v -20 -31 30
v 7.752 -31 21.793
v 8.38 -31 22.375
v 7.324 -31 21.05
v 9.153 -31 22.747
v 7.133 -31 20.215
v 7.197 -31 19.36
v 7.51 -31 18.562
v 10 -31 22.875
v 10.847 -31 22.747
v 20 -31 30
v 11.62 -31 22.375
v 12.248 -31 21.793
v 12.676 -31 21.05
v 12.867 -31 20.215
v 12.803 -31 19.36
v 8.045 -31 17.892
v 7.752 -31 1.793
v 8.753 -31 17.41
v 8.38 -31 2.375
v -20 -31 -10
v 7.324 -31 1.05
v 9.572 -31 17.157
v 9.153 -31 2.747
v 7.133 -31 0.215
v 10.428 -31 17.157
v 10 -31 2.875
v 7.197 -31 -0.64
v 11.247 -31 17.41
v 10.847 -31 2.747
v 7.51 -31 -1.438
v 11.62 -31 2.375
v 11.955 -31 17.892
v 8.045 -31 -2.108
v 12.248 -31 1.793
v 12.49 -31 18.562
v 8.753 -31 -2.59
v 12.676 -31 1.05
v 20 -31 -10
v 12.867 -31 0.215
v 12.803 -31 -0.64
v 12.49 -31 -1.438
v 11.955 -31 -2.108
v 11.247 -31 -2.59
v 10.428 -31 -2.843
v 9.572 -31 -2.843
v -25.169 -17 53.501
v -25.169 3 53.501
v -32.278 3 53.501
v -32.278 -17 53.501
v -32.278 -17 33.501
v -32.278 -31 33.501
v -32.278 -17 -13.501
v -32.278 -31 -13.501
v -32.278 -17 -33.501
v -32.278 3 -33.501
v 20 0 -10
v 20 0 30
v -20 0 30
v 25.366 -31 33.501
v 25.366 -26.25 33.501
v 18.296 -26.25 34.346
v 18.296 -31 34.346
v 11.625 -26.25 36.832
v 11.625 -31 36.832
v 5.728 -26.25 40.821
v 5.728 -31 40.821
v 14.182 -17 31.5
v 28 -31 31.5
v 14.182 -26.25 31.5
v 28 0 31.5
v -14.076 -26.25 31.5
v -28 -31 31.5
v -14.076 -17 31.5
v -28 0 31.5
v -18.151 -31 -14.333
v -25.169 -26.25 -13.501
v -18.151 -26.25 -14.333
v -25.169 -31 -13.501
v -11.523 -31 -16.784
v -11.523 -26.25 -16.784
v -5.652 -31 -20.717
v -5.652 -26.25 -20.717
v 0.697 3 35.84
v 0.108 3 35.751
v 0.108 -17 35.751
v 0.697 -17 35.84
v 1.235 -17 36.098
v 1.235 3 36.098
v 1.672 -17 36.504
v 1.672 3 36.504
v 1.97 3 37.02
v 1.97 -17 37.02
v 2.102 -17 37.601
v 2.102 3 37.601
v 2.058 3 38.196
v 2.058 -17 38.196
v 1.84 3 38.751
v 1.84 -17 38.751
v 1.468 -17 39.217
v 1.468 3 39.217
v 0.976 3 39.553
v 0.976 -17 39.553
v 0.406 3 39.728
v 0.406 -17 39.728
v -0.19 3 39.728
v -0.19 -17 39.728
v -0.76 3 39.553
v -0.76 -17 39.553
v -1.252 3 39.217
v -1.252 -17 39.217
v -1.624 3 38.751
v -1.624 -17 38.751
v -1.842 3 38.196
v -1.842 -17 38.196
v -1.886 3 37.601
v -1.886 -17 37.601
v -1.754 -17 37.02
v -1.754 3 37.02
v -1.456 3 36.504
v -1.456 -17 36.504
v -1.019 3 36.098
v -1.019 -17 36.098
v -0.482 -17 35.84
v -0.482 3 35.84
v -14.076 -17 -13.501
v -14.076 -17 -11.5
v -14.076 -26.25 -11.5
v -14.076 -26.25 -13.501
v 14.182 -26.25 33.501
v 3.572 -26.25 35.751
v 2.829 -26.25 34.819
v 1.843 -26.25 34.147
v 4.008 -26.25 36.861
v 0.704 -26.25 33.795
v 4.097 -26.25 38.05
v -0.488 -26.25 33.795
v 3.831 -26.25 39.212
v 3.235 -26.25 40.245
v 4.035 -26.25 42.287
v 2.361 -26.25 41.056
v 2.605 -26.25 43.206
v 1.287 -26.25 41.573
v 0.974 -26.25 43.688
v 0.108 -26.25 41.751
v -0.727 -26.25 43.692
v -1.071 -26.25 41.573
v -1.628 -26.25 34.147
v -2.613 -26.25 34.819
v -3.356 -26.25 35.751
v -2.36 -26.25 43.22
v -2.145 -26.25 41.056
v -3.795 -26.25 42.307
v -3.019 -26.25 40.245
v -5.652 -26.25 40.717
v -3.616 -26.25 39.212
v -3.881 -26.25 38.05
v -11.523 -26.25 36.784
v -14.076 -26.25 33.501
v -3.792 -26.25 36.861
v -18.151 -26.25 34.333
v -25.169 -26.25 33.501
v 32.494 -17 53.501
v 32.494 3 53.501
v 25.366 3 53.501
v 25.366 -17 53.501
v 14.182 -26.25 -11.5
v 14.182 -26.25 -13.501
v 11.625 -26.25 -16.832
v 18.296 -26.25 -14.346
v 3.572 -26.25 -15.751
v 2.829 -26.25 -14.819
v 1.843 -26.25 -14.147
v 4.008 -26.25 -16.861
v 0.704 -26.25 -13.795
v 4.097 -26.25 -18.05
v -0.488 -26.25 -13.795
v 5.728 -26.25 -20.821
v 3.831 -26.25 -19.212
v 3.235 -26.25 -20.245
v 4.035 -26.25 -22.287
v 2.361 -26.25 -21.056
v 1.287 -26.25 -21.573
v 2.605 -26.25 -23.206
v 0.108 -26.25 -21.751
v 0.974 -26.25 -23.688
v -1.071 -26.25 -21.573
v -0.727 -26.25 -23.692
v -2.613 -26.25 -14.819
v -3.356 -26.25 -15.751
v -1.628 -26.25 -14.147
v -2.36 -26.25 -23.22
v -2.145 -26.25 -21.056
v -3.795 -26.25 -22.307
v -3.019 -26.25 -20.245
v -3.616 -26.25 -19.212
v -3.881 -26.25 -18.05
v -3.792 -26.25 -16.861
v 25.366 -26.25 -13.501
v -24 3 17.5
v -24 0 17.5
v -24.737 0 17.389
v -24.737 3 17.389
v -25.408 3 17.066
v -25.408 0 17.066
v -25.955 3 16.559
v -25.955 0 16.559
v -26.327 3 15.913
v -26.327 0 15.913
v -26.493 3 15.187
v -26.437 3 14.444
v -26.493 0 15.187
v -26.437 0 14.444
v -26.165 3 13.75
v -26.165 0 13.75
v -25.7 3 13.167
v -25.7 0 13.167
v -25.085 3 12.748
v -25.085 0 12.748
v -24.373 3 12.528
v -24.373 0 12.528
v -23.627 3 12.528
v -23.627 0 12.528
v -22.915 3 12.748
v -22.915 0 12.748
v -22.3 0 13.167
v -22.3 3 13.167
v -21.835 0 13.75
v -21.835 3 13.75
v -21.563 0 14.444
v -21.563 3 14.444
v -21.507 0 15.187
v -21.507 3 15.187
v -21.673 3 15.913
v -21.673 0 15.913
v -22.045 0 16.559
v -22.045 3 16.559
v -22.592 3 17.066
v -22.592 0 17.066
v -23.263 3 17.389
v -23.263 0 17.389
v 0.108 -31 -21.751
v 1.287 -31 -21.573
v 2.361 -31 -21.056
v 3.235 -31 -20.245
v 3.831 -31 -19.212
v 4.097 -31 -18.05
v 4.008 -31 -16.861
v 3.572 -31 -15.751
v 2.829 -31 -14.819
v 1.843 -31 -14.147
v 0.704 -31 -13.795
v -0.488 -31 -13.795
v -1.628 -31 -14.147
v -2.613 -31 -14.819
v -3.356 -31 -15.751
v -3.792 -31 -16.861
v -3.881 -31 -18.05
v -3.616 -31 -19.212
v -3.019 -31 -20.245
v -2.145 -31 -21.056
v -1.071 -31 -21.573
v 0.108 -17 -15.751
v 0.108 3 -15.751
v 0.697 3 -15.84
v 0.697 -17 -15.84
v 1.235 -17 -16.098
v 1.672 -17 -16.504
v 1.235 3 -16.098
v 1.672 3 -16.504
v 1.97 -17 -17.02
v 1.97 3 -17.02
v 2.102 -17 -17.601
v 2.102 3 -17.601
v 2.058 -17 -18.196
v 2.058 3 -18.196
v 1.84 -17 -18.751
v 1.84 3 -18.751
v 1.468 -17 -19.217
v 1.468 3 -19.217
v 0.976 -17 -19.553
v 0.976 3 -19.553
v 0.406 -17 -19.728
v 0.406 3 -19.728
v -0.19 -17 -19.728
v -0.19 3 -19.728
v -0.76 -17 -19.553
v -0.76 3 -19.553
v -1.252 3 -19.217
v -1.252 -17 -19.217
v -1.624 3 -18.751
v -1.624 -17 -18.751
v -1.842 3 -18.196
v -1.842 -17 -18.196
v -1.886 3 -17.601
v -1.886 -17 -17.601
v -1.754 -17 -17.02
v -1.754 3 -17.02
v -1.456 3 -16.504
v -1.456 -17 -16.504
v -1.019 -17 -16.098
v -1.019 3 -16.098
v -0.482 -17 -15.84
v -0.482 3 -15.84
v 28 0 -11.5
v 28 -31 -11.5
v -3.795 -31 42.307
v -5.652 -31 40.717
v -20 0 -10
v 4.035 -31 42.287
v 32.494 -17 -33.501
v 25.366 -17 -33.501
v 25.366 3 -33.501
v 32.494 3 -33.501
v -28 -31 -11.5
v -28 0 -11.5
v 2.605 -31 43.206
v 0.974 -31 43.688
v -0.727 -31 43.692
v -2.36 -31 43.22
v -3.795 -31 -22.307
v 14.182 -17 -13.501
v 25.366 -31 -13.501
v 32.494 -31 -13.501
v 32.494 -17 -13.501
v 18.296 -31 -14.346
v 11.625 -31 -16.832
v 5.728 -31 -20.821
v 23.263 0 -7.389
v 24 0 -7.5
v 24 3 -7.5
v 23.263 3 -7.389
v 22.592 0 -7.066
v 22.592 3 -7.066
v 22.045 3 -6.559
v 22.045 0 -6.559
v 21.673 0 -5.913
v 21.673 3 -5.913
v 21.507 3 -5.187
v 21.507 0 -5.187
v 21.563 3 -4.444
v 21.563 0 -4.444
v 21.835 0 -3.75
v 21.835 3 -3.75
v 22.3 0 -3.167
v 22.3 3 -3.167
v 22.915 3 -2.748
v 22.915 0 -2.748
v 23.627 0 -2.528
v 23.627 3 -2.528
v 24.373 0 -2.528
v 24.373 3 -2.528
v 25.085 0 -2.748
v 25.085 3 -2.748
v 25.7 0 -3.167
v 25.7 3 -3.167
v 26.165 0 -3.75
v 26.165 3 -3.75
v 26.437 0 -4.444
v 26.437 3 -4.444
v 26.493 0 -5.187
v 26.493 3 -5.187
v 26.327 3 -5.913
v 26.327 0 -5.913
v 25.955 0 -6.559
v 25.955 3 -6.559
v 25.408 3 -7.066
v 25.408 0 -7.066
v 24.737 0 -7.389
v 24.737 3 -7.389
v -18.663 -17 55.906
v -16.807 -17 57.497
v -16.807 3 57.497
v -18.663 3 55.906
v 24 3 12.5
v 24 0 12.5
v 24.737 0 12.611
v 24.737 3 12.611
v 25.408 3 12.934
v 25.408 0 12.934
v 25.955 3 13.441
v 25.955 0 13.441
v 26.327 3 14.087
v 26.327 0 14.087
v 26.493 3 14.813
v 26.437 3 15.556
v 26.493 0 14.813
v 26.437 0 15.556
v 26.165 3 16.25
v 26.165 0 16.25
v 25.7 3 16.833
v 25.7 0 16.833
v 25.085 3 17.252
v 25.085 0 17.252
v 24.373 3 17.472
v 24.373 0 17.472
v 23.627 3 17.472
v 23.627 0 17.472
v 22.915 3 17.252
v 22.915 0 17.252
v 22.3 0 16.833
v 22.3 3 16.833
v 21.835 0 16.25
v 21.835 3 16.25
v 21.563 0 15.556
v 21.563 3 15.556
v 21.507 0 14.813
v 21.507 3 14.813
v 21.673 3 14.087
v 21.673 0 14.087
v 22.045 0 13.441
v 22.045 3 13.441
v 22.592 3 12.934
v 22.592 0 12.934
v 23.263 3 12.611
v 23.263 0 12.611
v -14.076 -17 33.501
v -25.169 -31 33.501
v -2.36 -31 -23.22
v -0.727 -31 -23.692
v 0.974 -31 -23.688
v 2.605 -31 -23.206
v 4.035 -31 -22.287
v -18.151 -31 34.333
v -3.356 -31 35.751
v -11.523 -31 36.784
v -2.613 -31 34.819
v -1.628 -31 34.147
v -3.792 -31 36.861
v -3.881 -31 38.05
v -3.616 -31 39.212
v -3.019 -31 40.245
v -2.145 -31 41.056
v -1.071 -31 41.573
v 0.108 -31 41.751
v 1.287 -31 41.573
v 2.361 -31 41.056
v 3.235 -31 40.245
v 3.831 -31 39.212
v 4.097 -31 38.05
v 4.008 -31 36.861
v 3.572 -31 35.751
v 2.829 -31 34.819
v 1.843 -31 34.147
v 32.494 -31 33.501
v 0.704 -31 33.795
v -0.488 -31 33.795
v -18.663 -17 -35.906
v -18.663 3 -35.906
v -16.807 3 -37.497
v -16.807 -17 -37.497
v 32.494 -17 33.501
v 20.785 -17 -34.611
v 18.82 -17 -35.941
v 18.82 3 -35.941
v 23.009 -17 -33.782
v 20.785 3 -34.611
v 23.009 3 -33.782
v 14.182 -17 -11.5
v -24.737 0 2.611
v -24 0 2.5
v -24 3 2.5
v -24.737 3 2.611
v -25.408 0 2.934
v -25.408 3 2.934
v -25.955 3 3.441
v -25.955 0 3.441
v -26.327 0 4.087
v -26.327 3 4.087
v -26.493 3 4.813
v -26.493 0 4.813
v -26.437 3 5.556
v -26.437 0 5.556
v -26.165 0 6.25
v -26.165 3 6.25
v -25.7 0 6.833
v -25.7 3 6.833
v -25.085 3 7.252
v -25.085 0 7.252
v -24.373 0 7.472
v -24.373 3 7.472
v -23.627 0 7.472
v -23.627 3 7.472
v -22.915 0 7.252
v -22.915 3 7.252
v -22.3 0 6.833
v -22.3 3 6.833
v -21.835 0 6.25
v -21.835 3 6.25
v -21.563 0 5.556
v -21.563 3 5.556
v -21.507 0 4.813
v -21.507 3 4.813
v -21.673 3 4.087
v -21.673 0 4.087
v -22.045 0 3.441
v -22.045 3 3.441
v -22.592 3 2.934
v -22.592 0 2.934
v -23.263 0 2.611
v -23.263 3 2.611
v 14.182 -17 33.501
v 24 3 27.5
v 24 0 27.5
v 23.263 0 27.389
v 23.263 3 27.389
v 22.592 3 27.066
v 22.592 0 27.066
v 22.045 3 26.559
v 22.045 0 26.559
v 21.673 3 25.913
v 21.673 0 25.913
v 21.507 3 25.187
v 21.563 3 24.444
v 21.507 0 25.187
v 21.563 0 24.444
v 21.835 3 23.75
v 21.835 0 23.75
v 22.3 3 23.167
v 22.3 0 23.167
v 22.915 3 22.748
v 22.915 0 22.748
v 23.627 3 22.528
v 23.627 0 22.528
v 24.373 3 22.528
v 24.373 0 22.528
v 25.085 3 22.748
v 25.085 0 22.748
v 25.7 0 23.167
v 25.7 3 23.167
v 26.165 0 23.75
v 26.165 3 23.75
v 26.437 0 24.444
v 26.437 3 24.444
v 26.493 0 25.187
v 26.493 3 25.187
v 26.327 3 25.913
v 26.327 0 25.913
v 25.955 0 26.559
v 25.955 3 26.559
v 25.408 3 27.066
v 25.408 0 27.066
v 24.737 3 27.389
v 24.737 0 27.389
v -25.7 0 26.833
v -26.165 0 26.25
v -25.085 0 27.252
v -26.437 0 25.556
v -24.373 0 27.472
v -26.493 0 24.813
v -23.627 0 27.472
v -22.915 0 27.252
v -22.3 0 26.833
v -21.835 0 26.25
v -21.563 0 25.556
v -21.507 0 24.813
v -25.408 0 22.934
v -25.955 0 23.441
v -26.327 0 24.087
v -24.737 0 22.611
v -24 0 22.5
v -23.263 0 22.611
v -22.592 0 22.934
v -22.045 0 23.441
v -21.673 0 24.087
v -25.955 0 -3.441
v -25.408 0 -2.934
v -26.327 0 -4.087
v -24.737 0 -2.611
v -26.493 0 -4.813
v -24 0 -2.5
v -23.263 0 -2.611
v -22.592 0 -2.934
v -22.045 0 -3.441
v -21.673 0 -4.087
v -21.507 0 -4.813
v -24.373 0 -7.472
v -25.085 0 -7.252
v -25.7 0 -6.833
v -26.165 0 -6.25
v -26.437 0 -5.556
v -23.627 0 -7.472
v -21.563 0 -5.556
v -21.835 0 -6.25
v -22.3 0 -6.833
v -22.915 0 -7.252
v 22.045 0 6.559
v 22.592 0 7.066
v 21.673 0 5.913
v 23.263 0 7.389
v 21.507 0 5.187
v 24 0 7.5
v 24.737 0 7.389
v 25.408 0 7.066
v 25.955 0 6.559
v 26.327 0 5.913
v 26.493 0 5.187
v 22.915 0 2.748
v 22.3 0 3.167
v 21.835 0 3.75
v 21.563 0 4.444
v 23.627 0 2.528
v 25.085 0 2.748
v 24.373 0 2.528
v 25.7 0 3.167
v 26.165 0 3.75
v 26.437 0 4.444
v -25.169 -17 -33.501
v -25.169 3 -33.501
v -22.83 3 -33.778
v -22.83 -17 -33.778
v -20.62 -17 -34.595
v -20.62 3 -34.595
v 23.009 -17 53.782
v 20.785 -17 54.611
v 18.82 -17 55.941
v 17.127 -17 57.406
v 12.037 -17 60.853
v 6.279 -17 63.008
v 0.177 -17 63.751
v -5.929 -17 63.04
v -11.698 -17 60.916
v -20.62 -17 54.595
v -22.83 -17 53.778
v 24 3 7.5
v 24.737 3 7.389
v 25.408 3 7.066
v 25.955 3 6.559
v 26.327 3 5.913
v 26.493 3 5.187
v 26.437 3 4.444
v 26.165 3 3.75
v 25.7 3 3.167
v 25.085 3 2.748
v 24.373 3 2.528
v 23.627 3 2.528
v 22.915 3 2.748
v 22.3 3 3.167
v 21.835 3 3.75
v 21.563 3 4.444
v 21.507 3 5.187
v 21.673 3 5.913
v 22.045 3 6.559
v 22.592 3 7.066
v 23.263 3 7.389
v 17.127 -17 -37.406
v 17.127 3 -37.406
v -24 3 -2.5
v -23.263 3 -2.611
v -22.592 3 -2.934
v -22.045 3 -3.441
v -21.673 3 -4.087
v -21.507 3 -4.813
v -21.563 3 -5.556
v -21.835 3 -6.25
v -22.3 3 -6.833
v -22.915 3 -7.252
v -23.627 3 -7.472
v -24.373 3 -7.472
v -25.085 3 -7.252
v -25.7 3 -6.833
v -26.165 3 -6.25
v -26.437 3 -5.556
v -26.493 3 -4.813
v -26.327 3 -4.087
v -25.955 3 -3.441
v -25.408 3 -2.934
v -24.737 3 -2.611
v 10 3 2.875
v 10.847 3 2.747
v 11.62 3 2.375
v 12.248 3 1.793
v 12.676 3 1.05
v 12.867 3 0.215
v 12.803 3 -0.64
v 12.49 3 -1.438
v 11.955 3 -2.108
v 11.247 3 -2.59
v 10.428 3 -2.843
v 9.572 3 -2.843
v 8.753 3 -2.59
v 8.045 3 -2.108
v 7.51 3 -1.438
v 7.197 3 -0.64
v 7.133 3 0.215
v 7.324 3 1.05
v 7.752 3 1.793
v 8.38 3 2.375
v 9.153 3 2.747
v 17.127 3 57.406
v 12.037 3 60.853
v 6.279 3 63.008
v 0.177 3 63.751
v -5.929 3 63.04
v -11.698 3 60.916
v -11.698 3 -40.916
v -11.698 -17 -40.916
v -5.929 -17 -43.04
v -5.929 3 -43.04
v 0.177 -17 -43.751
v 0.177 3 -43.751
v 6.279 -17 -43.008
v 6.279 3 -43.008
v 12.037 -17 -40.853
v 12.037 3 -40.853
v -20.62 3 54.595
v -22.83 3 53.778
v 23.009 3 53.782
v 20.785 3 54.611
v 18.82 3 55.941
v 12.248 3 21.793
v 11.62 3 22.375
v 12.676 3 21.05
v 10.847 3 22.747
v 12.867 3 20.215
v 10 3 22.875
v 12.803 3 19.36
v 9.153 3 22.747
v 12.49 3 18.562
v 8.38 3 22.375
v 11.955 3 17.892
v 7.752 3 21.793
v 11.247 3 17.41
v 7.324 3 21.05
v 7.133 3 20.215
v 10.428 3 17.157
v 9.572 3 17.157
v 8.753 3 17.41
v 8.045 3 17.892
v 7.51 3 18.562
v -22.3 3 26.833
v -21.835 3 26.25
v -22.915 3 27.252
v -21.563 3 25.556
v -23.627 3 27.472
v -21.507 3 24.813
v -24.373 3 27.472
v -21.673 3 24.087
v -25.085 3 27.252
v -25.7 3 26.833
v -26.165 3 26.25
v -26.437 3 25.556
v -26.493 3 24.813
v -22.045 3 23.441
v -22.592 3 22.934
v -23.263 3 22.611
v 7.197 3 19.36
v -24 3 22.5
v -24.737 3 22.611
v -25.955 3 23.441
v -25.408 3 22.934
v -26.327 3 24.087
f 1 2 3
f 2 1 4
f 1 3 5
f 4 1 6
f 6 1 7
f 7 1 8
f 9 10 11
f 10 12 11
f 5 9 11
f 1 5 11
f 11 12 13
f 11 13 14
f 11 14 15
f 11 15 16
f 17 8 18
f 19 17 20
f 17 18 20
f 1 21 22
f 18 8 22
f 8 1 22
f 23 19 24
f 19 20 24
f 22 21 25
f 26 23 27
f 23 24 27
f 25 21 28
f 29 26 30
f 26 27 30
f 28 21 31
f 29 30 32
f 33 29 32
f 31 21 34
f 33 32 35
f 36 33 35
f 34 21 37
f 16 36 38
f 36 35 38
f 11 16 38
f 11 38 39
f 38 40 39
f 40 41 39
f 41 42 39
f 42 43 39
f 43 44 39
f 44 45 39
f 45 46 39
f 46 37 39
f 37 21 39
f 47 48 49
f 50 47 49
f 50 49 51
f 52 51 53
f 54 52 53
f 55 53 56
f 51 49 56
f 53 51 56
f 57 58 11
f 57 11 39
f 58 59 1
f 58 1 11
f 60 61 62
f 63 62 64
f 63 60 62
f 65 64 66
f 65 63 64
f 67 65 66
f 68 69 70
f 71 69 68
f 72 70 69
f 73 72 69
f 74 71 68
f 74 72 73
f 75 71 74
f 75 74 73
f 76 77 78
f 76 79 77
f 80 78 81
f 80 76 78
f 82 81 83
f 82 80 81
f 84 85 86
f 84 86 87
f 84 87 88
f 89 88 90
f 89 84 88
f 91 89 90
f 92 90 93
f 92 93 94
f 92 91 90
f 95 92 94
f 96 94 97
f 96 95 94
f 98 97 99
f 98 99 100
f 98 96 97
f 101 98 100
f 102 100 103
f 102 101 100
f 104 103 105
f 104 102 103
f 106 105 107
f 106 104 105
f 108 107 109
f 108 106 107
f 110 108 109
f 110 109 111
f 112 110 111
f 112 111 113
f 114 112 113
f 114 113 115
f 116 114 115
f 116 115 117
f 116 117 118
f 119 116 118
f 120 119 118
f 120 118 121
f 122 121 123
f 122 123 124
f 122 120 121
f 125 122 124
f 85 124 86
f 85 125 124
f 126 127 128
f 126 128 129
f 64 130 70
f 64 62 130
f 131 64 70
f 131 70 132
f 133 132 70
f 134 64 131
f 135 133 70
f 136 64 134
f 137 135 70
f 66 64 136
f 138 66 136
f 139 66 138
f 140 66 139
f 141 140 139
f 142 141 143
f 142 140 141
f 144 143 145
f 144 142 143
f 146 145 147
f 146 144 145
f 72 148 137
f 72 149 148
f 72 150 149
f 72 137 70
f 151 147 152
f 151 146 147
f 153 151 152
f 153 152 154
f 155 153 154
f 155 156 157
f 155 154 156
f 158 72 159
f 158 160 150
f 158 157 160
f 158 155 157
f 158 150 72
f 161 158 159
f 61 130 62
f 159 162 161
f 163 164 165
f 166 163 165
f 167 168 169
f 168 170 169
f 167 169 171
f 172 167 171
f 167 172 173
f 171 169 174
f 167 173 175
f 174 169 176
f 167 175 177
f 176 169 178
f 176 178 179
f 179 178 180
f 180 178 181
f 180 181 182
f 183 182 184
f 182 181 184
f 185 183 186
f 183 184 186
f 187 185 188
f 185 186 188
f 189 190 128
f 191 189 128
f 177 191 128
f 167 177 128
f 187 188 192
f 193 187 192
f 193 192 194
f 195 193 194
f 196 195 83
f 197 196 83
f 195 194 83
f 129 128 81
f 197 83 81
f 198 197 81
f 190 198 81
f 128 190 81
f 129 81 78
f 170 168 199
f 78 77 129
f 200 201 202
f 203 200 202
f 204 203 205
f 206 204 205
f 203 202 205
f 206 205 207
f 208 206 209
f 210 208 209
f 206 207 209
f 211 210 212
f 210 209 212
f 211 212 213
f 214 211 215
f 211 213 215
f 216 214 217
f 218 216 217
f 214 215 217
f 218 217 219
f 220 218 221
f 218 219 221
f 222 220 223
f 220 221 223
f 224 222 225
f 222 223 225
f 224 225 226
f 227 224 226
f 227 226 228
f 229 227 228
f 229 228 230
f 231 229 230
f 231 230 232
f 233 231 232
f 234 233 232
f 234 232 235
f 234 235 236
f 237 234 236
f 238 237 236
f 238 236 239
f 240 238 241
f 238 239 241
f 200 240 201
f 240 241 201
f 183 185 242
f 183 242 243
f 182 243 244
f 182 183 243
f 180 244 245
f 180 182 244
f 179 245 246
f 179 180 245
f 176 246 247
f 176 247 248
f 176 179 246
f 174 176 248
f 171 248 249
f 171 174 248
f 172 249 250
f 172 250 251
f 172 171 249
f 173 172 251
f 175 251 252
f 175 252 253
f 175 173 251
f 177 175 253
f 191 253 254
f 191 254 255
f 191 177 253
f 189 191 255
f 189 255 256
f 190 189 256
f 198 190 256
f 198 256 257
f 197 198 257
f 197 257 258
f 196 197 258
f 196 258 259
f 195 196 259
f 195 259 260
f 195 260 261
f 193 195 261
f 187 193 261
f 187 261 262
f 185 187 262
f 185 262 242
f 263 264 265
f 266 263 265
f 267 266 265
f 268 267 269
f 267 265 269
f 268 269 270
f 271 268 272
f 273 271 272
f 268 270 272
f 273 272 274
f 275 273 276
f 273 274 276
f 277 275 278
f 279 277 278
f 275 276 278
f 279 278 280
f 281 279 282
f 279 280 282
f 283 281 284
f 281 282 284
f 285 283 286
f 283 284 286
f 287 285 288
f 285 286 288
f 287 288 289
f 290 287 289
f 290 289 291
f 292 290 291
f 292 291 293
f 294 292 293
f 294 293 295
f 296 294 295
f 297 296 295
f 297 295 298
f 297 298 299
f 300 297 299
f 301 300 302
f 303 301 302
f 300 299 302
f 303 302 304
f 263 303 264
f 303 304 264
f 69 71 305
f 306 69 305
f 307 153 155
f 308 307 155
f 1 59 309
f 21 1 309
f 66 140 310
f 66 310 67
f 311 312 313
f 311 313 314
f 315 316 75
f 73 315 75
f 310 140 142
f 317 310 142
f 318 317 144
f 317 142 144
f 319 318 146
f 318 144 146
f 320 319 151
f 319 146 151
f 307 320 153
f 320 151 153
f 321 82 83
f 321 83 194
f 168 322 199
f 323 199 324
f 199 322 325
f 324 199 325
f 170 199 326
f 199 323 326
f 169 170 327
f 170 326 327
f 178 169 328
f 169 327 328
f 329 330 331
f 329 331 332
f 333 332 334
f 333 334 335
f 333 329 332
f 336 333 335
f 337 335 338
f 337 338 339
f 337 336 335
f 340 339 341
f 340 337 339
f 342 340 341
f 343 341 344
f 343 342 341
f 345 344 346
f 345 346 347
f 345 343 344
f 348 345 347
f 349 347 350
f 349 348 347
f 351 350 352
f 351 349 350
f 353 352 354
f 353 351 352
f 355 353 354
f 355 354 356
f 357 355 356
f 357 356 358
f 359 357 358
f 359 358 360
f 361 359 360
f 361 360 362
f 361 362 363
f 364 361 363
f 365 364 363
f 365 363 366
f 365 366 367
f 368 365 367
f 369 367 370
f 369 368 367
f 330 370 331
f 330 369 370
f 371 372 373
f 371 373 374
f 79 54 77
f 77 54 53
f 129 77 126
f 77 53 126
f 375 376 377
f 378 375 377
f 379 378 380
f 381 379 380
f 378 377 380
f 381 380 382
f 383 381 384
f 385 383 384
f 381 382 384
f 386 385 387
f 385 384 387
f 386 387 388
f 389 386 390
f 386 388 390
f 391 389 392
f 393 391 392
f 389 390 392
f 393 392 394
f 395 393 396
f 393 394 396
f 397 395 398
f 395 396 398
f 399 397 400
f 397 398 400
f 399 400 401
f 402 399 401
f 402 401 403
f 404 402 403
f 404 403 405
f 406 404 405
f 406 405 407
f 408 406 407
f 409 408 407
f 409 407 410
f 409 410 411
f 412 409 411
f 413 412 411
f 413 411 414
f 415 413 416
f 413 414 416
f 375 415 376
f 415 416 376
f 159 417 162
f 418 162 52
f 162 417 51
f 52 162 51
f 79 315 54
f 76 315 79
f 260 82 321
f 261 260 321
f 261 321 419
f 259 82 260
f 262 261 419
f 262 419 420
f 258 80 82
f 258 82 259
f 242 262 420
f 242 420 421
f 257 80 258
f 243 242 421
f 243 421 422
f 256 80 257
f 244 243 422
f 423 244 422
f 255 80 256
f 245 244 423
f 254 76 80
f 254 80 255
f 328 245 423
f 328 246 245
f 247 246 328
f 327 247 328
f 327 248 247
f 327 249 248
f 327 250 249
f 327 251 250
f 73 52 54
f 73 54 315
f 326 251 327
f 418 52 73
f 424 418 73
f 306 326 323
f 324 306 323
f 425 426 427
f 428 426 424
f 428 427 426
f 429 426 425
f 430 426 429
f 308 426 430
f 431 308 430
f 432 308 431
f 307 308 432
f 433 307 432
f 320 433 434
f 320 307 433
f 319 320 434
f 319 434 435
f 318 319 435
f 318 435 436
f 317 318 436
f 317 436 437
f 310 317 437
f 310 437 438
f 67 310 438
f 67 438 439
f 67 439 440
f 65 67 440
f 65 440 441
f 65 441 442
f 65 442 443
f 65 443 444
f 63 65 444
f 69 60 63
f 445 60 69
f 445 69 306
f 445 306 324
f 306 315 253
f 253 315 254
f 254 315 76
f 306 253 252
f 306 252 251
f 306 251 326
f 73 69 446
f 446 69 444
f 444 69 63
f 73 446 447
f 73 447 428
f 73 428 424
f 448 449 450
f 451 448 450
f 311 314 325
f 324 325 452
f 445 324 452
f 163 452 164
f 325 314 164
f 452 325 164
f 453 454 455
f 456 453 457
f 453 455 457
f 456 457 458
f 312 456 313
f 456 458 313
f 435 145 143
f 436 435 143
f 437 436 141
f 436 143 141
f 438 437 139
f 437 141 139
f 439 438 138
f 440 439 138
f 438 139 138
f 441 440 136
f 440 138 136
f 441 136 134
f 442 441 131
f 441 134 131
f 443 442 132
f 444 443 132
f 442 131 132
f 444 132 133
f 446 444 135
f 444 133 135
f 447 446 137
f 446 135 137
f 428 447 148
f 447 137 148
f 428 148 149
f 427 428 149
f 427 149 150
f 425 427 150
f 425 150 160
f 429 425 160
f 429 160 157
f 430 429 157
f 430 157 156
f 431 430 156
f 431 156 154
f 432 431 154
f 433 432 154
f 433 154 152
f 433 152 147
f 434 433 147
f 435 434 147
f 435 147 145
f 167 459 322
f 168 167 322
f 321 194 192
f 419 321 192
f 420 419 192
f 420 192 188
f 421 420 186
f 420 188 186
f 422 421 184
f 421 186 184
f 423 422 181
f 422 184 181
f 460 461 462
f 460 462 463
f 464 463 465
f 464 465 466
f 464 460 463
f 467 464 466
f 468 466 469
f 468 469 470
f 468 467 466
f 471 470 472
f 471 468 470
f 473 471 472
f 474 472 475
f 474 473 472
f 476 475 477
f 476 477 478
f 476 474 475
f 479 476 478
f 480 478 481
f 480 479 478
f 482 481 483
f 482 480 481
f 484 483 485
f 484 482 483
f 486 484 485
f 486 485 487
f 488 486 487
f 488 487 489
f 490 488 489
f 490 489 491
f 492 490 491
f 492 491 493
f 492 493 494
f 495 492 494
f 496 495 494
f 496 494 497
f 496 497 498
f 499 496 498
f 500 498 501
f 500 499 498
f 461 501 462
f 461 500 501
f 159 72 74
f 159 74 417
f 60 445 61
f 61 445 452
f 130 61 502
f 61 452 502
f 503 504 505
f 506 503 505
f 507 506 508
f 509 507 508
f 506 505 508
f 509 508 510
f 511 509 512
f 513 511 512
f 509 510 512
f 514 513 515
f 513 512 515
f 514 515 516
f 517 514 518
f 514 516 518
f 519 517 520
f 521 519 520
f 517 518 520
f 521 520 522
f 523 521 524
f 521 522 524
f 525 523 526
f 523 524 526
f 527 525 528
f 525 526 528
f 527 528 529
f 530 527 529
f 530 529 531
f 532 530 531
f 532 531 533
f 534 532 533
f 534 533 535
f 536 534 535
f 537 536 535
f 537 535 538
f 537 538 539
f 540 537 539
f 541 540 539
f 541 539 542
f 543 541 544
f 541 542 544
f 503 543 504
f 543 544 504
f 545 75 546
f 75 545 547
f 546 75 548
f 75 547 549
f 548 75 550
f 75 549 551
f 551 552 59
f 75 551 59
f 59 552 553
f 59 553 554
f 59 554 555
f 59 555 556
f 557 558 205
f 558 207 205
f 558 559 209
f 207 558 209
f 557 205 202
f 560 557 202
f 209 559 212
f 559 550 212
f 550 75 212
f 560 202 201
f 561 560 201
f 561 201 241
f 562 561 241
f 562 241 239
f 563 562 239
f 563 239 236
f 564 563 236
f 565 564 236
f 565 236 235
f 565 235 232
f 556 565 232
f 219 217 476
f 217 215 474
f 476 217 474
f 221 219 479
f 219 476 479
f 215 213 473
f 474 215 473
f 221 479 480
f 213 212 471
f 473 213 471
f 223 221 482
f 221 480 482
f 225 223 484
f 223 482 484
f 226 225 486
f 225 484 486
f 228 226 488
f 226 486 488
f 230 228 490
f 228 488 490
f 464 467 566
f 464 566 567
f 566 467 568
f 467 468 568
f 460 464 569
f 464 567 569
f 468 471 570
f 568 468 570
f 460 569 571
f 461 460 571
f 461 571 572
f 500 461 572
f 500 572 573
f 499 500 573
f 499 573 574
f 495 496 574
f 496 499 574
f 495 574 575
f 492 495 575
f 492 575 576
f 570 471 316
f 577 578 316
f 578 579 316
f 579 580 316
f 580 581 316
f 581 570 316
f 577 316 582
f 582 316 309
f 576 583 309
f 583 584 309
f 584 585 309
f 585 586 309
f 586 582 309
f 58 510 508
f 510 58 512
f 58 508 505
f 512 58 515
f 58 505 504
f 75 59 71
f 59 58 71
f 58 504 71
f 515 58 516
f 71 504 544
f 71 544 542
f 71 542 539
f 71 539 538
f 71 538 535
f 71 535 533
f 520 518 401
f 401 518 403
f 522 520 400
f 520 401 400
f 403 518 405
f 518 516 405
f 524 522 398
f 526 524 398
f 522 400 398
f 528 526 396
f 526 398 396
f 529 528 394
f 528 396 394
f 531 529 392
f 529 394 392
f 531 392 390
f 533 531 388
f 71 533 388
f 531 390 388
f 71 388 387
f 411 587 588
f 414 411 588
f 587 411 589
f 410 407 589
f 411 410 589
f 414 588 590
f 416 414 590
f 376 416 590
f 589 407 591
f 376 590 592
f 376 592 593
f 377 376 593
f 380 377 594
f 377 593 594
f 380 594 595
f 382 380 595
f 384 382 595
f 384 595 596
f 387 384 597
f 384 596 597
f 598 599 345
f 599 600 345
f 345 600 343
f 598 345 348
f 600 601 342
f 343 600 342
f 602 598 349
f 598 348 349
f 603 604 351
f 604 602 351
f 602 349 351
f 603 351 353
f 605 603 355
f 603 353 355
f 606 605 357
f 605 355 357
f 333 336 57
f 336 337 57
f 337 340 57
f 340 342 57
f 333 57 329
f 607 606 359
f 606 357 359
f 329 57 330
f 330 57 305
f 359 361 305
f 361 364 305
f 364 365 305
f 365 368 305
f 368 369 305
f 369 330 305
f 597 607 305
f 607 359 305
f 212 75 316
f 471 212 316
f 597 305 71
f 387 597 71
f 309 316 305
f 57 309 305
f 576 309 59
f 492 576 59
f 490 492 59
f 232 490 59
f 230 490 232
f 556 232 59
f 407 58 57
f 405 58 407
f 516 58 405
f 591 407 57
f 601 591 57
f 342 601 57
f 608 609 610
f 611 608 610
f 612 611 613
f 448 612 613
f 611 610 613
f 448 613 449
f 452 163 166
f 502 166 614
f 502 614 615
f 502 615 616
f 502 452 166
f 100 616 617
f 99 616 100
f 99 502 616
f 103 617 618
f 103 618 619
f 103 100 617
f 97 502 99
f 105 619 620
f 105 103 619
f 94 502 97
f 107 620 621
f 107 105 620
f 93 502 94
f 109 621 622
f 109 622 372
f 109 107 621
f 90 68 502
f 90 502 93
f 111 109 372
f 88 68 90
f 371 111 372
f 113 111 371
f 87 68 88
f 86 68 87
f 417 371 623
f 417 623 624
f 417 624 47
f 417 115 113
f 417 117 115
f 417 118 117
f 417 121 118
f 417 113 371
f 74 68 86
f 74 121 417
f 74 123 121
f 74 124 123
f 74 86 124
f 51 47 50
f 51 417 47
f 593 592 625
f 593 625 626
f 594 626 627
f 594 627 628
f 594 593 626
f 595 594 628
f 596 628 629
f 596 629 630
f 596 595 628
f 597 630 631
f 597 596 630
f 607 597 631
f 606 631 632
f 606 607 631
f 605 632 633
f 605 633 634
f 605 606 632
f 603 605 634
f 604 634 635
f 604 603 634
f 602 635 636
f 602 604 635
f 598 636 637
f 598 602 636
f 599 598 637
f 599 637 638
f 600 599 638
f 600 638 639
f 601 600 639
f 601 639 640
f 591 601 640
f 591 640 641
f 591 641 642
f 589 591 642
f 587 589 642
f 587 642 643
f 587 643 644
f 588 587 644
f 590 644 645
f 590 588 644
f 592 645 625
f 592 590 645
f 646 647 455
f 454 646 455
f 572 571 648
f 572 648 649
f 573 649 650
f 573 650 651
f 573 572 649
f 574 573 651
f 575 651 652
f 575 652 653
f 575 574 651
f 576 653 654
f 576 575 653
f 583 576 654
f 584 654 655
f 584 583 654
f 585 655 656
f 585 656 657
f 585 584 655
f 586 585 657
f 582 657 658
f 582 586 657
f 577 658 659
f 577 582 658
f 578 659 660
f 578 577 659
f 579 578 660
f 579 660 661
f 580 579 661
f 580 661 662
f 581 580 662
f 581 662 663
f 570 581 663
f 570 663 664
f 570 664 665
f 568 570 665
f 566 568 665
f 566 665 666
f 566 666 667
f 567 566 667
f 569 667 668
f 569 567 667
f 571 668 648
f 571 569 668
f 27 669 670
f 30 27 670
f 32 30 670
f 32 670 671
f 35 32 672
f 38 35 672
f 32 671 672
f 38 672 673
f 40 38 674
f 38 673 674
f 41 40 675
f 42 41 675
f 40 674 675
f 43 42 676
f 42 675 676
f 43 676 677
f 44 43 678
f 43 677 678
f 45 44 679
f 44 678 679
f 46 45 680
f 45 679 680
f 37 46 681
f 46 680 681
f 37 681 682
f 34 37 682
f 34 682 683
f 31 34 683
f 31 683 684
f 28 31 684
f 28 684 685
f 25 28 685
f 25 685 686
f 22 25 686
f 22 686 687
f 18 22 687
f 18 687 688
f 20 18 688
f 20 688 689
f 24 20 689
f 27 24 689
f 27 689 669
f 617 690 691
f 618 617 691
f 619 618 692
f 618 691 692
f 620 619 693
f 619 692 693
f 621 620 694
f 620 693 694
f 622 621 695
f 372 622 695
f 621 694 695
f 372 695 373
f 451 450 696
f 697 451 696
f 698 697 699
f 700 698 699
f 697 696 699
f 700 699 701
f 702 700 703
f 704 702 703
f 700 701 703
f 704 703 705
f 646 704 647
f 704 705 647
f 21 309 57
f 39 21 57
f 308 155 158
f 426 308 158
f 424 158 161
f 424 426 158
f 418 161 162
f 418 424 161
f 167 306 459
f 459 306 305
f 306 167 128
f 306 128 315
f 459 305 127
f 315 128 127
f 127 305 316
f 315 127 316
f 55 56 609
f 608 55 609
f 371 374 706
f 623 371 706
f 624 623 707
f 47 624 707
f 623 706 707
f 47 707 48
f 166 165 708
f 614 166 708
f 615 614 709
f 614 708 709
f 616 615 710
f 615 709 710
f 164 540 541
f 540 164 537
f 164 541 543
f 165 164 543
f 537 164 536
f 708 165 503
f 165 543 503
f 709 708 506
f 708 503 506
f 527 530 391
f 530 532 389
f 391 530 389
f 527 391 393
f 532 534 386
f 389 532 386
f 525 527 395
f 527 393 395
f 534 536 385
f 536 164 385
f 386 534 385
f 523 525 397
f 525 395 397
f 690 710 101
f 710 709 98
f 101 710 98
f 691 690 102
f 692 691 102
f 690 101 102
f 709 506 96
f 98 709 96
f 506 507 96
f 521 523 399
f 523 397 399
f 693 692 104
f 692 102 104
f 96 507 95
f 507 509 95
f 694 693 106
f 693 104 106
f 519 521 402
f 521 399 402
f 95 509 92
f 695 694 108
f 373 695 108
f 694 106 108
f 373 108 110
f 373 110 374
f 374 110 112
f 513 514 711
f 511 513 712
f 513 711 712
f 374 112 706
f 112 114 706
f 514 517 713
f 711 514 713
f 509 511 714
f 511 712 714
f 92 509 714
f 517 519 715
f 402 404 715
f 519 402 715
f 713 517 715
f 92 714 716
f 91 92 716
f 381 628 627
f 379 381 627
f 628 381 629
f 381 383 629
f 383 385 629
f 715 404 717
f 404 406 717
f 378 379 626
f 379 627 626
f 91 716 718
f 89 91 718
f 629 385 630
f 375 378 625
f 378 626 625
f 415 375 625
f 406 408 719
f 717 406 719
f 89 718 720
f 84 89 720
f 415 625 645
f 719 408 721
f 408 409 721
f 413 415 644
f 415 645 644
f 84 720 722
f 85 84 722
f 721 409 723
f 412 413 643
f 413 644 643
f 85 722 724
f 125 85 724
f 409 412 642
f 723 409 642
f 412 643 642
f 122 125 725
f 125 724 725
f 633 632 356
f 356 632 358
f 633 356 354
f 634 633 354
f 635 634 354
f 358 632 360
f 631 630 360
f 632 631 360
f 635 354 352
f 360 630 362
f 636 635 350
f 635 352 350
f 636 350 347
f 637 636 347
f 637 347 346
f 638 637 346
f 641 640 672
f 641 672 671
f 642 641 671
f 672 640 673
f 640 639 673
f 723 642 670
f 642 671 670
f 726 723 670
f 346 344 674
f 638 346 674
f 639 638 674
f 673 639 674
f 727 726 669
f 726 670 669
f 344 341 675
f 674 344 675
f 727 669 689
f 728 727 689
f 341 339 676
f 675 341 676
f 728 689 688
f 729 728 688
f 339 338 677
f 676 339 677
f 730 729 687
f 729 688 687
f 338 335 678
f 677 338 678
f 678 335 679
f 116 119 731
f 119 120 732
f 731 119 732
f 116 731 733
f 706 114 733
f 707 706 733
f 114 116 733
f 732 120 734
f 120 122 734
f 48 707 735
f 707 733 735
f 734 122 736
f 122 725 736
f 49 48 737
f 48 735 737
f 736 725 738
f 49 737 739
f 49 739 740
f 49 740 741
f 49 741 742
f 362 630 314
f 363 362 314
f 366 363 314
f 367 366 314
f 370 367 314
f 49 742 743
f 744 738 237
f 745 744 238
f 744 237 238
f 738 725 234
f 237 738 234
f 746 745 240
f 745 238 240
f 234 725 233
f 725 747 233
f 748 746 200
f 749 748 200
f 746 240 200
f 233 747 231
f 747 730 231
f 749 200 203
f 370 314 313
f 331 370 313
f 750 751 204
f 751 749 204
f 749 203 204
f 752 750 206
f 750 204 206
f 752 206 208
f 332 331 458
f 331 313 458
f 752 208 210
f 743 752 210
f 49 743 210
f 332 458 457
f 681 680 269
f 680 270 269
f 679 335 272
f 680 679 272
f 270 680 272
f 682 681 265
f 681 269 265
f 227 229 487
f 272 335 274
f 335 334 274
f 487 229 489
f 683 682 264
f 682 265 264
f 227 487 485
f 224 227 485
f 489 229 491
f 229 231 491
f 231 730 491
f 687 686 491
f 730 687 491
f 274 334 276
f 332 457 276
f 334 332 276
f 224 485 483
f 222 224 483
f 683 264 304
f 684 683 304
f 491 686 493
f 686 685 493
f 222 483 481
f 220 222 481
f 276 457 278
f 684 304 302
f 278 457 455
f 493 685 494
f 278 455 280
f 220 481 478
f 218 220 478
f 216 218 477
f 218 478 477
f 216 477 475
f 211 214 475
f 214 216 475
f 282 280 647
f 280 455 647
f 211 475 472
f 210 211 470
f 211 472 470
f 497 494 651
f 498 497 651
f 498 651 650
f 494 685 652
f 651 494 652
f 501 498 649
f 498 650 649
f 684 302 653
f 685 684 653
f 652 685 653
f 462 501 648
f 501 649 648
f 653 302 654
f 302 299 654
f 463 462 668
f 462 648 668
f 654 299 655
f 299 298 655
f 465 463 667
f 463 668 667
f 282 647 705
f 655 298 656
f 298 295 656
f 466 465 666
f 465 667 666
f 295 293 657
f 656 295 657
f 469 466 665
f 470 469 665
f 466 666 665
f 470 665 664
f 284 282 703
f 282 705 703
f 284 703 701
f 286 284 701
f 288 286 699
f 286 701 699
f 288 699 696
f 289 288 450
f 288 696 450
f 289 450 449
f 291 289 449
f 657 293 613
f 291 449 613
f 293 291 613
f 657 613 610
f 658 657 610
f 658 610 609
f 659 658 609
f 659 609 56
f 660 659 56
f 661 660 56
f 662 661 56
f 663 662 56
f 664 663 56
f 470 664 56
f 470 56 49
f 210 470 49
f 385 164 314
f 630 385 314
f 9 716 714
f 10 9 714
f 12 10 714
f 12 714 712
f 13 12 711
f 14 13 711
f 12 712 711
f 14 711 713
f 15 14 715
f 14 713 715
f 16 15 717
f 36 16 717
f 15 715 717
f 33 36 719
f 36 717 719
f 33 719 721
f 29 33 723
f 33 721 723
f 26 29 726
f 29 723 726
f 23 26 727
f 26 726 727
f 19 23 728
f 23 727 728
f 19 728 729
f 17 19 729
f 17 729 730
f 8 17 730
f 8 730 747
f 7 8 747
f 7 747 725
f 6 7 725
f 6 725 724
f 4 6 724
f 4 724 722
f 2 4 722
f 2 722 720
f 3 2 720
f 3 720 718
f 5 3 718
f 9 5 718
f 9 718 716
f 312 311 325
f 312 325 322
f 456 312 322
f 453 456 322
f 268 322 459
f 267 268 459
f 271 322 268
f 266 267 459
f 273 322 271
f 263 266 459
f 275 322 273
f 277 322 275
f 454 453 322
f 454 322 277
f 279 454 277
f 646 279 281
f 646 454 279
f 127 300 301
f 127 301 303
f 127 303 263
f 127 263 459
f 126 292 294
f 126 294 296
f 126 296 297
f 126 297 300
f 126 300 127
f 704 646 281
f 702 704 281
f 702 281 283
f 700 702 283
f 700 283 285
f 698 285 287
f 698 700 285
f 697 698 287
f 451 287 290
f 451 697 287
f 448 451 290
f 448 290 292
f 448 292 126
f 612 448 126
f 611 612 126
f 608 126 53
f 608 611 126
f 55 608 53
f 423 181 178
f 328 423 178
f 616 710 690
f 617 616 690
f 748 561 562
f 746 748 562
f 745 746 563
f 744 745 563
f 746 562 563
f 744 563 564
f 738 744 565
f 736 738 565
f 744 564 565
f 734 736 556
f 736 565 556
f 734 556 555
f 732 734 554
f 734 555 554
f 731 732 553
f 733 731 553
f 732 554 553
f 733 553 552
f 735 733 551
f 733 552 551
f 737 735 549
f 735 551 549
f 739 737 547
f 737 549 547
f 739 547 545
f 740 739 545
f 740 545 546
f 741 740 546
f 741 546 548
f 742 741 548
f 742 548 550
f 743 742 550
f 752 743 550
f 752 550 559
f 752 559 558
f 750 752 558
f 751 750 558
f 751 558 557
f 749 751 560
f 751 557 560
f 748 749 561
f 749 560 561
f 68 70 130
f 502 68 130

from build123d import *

# Parameters (mm, degrees)
SKETCH2_R           = 2.5
BOSS_EXTRUDE1_DEPTH = 3
BOSS_EXTRUDE2_DEPTH = 20
SKETCH4_R           = 2
BOSS_EXTRUDE3_DEPTH = 20
SKETCH6_R           = 4
BOSS_EXTRUDE5_DEPTH = 14
SKETCH7_W           = 28.258698574
SKETCH7_H           = 15
CUT_EXTRUDE1_DEPTH  = 9.25
FILLET1_R           = 30
SKETCH13_W          = 40
SKETCH13_H          = 40
BOSS_EXTRUDE8_DEPTH = 34
SKETCH14_R          = 2.875
CUT_EXTRUDE4_DEPTH  = 65.233633019
BOSS_EXTRUDE9_DEPTH = 20


with BuildPart() as part:
    # Sketch2 → Boss-Extrude1 (new body)
    with BuildSketch(Plane(origin=(0, 0, 0), x_dir=(1, 0, 0), z_dir=(0, 1, 0))):
        Polygon((-28, -11.5), (-20, -11.5), (-20, 10), (20, 10), (20, -11.5), (28, -11.5), (28, 11.5), (-28, 11.5), align=None)
        with Locations(Location((-24, 5, 0), (0, 0, 270))):
            Circle(SKETCH2_R, mode=Mode.SUBTRACT)
        with Locations(Location((-24, -5, 0), (0, 0, 90))):
            Circle(SKETCH2_R, mode=Mode.SUBTRACT)
        with Locations(Location((24, -5, 0), (0, 0, 270))):
            Circle(SKETCH2_R, mode=Mode.SUBTRACT)
        with Locations(Location((24, 5, 0), (0, 0, 90))):
            Circle(SKETCH2_R, mode=Mode.SUBTRACT)
    boss_extrude1 = extrude(amount=BOSS_EXTRUDE1_DEPTH)

    # Sketch3 → Boss-Extrude2 (add)
    with BuildSketch(Plane(origin=(0, 3, 0), x_dir=(1, 0, 0), z_dir=(0, 1, 0))):
        Polygon((-32.277683008, 10.5), (-32.277683008, -11.5), (-28, -11.5), (-28, 11.5), (28, 11.5), (28, -11.5), (32.493544997, -11.5), (32.493544997, 10.5), (32.493544997, 13.500761643), (-32.277683008, 13.500761643), align=None)
    boss_extrude2 = extrude(amount=-BOSS_EXTRUDE2_DEPTH)

    # Sketch4 → Boss-Extrude3 (add)
    with BuildSketch(Plane(origin=(0, 3, 0), x_dir=(1, 0, 0), z_dir=(0, 1, 0))):
        with BuildLine():
            Line((-3.795424266, 22.307494871), (-16.411972775, 11.5))
            Line((-16.411972775, 11.5), (16.493090482, 11.5))
            Line((16.493090482, 11.5), (4.035447529, 22.286686452))
            ThreePointArc((4.035447529, 22.286686452), (0.123874312, 23.75074046), (-3.795424266, 22.307494871))
        make_face()
        with Locations(Location((0.107930995, 17.750761643, 0), (0, 0, 270))):
            Circle(SKETCH4_R, mode=Mode.SUBTRACT)
    boss_extrude3 = extrude(amount=-BOSS_EXTRUDE3_DEPTH)

    # Sketch6 → Boss-Extrude5 (add)
    with BuildSketch(Plane.XZ.offset(17)):
        with BuildLine():
            Line((28, 11.5), (28, -11.5))
            Line((28, -11.5), (-28, -11.5))
            Line((-28, -11.5), (-28, 11.5))
            Line((-28, 11.5), (-32.277683008, 11.5))
            Line((-32.277683008, 11.5), (-32.277683008, -13.500761643))
            Line((-32.277683008, -13.500761643), (-14.076306034, -13.500761643))
            Line((-14.076306034, -13.500761643), (-3.795424266, -22.307494871))
            ThreePointArc((-3.795424266, -22.307494871), (0.123874312, -23.75074046), (4.035447529, -22.286686452))
            Line((4.035447529, -22.286686452), (14.18239254, -13.500761643))
            Line((14.18239254, -13.500761643), (32.493544997, -13.500761643))
            Line((32.493544997, -13.500761643), (32.493544997, 11.5))
            Line((32.493544997, 11.5), (28, 11.5))
        make_face()
        with Locations(Location((0.107930995, -17.750761643, 0), (0, 0, 270))):
            Circle(SKETCH6_R, mode=Mode.SUBTRACT)
    boss_extrude5 = extrude(amount=BOSS_EXTRUDE5_DEPTH)

    # Sketch7 → Cut-Extrude1 (cut)
    with BuildSketch(Plane(origin=(0, -17, 0), x_dir=(-1, 0, 0), z_dir=(0, -1, 0))):
        with Locations((-0.053043253, 19)):
            Rectangle(SKETCH7_W, SKETCH7_H)
    cut_extrude1 = extrude(amount=CUT_EXTRUDE1_DEPTH, mode=Mode.SUBTRACT)

    # Mirror1: Boss-Extrude1, Boss-Extrude2, Boss-Extrude3, Boss-Extrude5, Cut-Extrude1 across plane
    add(boss_extrude1.mirror(Plane.XY.offset(10)))
    add(boss_extrude2.mirror(Plane.XY.offset(10)))
    add(boss_extrude3.mirror(Plane.XY.offset(10)))
    add(boss_extrude5.mirror(Plane.XY.offset(10)))
    add(cut_extrude1.mirror(Plane.XY.offset(10)), mode=Mode.SUBTRACT)

    # Fillet1
    fillet1_edges = [part.edges().sort_by_distance(p)[0] for p in [
        (14.18239254, -28.625, -13.500761643),
        (-14.076306034, -7, -13.500761643),
        (14.18239254, -28.625, 33.500761643),
        (-14.076306034, -7, 33.500761643),
        (14.18239254, -7, 33.500761643),
        (-14.076306034, -28.625, 33.500761643),
        (-14.076306034, -28.625, -13.500761643),
        (14.18239254, -7, -13.500761643),
    ]]
    fillet(fillet1_edges, radius=FILLET1_R)

    # Sketch13 → Boss-Extrude8 (add)
    with BuildSketch(Plane(origin=(0, 3, 0), x_dir=(1, 0, 0), z_dir=(0, 1, 0))):
        with Locations((0, -10)):
            Rectangle(SKETCH13_W, SKETCH13_H)
    extrude(amount=-BOSS_EXTRUDE8_DEPTH)

    # Sketch14 → Cut-Extrude4 (cut, through all)
    with BuildSketch(Plane(origin=(0, 3, 0), x_dir=(1, 0, 0), z_dir=(0, 1, 0))):
        with Locations(Location((10, 0, 0), (0, 0, 270))):
            Circle(SKETCH14_R)
        with Locations(Location((10, -20, 0), (0, 0, 270))):
            Circle(SKETCH14_R)
    extrude(amount=-CUT_EXTRUDE4_DEPTH, mode=Mode.SUBTRACT)

    # Sketch15 → Boss-Extrude9 (add)
    with BuildSketch(Plane(origin=(0, 3, 0), x_dir=(1, 0, 0), z_dir=(0, 1, 0))):
        with BuildLine():
            ThreePointArc((25.365605991, -53.500761643), (21.872666456, -54.130629658), (18.8197451, -55.940886962))
            Line((18.8197451, -55.940886962), (17.127169311, -57.406435814))
            ThreePointArc((17.127169311, -57.406435814), (0.177018704, -63.750669852), (-16.806608467, -57.496605631))
            Line((-16.806608467, -57.496605631), (-18.663222883, -55.906206263))
            ThreePointArc((-18.663222883, -55.906206263), (-21.700786279, -54.121381232), (-25.168814984, -53.500761643))
            Line((-25.168814984, -53.500761643), (-32.277683008, -53.500761643))
            Line((-32.277683008, -53.500761643), (-32.277683008, -33.500761643))
            Line((-32.277683008, -33.500761643), (-25.168814984, -33.500761643))
            ThreePointArc((-25.168814984, -33.500761643), (-14.764728868, -35.362620409), (-5.652038682, -40.717095502))
            Line((-5.652038682, -40.717095502), (-3.795424266, -42.307494871))
            ThreePointArc((-3.795424266, -42.307494871), (0.123874312, -43.75074046), (4.035447529, -42.286686452))
            Line((4.035447529, -42.286686452), (5.728023318, -40.821137599))
            ThreePointArc((5.728023318, -40.821137599), (14.886787387, -35.39036569), (25.365605991, -33.500761643))
            Line((25.365605991, -33.500761643), (32.493544997, -33.500761643))
            Line((32.493544997, -33.500761643), (32.493544997, -53.500761643))
            Line((32.493544997, -53.500761643), (25.365605991, -53.500761643))
        make_face()
        with BuildLine():
            ThreePointArc((18.8197451, 35.940886962), (21.872666456, 34.130629658), (25.365605991, 33.500761643))
            Line((25.365605991, 33.500761643), (32.493544997, 33.500761643))
            Line((32.493544997, 33.500761643), (32.493544997, 13.500761643))
            Line((32.493544997, 13.500761643), (25.365605991, 13.500761643))
            ThreePointArc((25.365605991, 13.500761643), (14.886787387, 15.39036569), (5.728023318, 20.821137599))
            Line((5.728023318, 20.821137599), (4.035447529, 22.286686452))
            ThreePointArc((4.035447529, 22.286686452), (0.123874312, 23.75074046), (-3.795424266, 22.307494871))
            Line((-3.795424266, 22.307494871), (-5.652038682, 20.717095502))
            ThreePointArc((-5.652038682, 20.717095502), (-14.764728868, 15.362620409), (-25.168814984, 13.500761643))
            Line((-25.168814984, 13.500761643), (-32.277683008, 13.500761643))
            Line((-32.277683008, 13.500761643), (-32.277683008, 33.500761643))
            Line((-32.277683008, 33.500761643), (-25.168814984, 33.500761643))
            ThreePointArc((-25.168814984, 33.500761643), (-21.700786279, 34.121381232), (-18.663222883, 35.906206263))
            Line((-18.663222883, 35.906206263), (-16.806608467, 37.496605631))
            ThreePointArc((-16.806608467, 37.496605631), (0.177018704, 43.750669852), (17.127169311, 37.406435814))
            Line((17.127169311, 37.406435814), (18.8197451, 35.940886962))
        make_face()
    extrude(amount=-BOSS_EXTRUDE9_DEPTH)


solid = part.part
